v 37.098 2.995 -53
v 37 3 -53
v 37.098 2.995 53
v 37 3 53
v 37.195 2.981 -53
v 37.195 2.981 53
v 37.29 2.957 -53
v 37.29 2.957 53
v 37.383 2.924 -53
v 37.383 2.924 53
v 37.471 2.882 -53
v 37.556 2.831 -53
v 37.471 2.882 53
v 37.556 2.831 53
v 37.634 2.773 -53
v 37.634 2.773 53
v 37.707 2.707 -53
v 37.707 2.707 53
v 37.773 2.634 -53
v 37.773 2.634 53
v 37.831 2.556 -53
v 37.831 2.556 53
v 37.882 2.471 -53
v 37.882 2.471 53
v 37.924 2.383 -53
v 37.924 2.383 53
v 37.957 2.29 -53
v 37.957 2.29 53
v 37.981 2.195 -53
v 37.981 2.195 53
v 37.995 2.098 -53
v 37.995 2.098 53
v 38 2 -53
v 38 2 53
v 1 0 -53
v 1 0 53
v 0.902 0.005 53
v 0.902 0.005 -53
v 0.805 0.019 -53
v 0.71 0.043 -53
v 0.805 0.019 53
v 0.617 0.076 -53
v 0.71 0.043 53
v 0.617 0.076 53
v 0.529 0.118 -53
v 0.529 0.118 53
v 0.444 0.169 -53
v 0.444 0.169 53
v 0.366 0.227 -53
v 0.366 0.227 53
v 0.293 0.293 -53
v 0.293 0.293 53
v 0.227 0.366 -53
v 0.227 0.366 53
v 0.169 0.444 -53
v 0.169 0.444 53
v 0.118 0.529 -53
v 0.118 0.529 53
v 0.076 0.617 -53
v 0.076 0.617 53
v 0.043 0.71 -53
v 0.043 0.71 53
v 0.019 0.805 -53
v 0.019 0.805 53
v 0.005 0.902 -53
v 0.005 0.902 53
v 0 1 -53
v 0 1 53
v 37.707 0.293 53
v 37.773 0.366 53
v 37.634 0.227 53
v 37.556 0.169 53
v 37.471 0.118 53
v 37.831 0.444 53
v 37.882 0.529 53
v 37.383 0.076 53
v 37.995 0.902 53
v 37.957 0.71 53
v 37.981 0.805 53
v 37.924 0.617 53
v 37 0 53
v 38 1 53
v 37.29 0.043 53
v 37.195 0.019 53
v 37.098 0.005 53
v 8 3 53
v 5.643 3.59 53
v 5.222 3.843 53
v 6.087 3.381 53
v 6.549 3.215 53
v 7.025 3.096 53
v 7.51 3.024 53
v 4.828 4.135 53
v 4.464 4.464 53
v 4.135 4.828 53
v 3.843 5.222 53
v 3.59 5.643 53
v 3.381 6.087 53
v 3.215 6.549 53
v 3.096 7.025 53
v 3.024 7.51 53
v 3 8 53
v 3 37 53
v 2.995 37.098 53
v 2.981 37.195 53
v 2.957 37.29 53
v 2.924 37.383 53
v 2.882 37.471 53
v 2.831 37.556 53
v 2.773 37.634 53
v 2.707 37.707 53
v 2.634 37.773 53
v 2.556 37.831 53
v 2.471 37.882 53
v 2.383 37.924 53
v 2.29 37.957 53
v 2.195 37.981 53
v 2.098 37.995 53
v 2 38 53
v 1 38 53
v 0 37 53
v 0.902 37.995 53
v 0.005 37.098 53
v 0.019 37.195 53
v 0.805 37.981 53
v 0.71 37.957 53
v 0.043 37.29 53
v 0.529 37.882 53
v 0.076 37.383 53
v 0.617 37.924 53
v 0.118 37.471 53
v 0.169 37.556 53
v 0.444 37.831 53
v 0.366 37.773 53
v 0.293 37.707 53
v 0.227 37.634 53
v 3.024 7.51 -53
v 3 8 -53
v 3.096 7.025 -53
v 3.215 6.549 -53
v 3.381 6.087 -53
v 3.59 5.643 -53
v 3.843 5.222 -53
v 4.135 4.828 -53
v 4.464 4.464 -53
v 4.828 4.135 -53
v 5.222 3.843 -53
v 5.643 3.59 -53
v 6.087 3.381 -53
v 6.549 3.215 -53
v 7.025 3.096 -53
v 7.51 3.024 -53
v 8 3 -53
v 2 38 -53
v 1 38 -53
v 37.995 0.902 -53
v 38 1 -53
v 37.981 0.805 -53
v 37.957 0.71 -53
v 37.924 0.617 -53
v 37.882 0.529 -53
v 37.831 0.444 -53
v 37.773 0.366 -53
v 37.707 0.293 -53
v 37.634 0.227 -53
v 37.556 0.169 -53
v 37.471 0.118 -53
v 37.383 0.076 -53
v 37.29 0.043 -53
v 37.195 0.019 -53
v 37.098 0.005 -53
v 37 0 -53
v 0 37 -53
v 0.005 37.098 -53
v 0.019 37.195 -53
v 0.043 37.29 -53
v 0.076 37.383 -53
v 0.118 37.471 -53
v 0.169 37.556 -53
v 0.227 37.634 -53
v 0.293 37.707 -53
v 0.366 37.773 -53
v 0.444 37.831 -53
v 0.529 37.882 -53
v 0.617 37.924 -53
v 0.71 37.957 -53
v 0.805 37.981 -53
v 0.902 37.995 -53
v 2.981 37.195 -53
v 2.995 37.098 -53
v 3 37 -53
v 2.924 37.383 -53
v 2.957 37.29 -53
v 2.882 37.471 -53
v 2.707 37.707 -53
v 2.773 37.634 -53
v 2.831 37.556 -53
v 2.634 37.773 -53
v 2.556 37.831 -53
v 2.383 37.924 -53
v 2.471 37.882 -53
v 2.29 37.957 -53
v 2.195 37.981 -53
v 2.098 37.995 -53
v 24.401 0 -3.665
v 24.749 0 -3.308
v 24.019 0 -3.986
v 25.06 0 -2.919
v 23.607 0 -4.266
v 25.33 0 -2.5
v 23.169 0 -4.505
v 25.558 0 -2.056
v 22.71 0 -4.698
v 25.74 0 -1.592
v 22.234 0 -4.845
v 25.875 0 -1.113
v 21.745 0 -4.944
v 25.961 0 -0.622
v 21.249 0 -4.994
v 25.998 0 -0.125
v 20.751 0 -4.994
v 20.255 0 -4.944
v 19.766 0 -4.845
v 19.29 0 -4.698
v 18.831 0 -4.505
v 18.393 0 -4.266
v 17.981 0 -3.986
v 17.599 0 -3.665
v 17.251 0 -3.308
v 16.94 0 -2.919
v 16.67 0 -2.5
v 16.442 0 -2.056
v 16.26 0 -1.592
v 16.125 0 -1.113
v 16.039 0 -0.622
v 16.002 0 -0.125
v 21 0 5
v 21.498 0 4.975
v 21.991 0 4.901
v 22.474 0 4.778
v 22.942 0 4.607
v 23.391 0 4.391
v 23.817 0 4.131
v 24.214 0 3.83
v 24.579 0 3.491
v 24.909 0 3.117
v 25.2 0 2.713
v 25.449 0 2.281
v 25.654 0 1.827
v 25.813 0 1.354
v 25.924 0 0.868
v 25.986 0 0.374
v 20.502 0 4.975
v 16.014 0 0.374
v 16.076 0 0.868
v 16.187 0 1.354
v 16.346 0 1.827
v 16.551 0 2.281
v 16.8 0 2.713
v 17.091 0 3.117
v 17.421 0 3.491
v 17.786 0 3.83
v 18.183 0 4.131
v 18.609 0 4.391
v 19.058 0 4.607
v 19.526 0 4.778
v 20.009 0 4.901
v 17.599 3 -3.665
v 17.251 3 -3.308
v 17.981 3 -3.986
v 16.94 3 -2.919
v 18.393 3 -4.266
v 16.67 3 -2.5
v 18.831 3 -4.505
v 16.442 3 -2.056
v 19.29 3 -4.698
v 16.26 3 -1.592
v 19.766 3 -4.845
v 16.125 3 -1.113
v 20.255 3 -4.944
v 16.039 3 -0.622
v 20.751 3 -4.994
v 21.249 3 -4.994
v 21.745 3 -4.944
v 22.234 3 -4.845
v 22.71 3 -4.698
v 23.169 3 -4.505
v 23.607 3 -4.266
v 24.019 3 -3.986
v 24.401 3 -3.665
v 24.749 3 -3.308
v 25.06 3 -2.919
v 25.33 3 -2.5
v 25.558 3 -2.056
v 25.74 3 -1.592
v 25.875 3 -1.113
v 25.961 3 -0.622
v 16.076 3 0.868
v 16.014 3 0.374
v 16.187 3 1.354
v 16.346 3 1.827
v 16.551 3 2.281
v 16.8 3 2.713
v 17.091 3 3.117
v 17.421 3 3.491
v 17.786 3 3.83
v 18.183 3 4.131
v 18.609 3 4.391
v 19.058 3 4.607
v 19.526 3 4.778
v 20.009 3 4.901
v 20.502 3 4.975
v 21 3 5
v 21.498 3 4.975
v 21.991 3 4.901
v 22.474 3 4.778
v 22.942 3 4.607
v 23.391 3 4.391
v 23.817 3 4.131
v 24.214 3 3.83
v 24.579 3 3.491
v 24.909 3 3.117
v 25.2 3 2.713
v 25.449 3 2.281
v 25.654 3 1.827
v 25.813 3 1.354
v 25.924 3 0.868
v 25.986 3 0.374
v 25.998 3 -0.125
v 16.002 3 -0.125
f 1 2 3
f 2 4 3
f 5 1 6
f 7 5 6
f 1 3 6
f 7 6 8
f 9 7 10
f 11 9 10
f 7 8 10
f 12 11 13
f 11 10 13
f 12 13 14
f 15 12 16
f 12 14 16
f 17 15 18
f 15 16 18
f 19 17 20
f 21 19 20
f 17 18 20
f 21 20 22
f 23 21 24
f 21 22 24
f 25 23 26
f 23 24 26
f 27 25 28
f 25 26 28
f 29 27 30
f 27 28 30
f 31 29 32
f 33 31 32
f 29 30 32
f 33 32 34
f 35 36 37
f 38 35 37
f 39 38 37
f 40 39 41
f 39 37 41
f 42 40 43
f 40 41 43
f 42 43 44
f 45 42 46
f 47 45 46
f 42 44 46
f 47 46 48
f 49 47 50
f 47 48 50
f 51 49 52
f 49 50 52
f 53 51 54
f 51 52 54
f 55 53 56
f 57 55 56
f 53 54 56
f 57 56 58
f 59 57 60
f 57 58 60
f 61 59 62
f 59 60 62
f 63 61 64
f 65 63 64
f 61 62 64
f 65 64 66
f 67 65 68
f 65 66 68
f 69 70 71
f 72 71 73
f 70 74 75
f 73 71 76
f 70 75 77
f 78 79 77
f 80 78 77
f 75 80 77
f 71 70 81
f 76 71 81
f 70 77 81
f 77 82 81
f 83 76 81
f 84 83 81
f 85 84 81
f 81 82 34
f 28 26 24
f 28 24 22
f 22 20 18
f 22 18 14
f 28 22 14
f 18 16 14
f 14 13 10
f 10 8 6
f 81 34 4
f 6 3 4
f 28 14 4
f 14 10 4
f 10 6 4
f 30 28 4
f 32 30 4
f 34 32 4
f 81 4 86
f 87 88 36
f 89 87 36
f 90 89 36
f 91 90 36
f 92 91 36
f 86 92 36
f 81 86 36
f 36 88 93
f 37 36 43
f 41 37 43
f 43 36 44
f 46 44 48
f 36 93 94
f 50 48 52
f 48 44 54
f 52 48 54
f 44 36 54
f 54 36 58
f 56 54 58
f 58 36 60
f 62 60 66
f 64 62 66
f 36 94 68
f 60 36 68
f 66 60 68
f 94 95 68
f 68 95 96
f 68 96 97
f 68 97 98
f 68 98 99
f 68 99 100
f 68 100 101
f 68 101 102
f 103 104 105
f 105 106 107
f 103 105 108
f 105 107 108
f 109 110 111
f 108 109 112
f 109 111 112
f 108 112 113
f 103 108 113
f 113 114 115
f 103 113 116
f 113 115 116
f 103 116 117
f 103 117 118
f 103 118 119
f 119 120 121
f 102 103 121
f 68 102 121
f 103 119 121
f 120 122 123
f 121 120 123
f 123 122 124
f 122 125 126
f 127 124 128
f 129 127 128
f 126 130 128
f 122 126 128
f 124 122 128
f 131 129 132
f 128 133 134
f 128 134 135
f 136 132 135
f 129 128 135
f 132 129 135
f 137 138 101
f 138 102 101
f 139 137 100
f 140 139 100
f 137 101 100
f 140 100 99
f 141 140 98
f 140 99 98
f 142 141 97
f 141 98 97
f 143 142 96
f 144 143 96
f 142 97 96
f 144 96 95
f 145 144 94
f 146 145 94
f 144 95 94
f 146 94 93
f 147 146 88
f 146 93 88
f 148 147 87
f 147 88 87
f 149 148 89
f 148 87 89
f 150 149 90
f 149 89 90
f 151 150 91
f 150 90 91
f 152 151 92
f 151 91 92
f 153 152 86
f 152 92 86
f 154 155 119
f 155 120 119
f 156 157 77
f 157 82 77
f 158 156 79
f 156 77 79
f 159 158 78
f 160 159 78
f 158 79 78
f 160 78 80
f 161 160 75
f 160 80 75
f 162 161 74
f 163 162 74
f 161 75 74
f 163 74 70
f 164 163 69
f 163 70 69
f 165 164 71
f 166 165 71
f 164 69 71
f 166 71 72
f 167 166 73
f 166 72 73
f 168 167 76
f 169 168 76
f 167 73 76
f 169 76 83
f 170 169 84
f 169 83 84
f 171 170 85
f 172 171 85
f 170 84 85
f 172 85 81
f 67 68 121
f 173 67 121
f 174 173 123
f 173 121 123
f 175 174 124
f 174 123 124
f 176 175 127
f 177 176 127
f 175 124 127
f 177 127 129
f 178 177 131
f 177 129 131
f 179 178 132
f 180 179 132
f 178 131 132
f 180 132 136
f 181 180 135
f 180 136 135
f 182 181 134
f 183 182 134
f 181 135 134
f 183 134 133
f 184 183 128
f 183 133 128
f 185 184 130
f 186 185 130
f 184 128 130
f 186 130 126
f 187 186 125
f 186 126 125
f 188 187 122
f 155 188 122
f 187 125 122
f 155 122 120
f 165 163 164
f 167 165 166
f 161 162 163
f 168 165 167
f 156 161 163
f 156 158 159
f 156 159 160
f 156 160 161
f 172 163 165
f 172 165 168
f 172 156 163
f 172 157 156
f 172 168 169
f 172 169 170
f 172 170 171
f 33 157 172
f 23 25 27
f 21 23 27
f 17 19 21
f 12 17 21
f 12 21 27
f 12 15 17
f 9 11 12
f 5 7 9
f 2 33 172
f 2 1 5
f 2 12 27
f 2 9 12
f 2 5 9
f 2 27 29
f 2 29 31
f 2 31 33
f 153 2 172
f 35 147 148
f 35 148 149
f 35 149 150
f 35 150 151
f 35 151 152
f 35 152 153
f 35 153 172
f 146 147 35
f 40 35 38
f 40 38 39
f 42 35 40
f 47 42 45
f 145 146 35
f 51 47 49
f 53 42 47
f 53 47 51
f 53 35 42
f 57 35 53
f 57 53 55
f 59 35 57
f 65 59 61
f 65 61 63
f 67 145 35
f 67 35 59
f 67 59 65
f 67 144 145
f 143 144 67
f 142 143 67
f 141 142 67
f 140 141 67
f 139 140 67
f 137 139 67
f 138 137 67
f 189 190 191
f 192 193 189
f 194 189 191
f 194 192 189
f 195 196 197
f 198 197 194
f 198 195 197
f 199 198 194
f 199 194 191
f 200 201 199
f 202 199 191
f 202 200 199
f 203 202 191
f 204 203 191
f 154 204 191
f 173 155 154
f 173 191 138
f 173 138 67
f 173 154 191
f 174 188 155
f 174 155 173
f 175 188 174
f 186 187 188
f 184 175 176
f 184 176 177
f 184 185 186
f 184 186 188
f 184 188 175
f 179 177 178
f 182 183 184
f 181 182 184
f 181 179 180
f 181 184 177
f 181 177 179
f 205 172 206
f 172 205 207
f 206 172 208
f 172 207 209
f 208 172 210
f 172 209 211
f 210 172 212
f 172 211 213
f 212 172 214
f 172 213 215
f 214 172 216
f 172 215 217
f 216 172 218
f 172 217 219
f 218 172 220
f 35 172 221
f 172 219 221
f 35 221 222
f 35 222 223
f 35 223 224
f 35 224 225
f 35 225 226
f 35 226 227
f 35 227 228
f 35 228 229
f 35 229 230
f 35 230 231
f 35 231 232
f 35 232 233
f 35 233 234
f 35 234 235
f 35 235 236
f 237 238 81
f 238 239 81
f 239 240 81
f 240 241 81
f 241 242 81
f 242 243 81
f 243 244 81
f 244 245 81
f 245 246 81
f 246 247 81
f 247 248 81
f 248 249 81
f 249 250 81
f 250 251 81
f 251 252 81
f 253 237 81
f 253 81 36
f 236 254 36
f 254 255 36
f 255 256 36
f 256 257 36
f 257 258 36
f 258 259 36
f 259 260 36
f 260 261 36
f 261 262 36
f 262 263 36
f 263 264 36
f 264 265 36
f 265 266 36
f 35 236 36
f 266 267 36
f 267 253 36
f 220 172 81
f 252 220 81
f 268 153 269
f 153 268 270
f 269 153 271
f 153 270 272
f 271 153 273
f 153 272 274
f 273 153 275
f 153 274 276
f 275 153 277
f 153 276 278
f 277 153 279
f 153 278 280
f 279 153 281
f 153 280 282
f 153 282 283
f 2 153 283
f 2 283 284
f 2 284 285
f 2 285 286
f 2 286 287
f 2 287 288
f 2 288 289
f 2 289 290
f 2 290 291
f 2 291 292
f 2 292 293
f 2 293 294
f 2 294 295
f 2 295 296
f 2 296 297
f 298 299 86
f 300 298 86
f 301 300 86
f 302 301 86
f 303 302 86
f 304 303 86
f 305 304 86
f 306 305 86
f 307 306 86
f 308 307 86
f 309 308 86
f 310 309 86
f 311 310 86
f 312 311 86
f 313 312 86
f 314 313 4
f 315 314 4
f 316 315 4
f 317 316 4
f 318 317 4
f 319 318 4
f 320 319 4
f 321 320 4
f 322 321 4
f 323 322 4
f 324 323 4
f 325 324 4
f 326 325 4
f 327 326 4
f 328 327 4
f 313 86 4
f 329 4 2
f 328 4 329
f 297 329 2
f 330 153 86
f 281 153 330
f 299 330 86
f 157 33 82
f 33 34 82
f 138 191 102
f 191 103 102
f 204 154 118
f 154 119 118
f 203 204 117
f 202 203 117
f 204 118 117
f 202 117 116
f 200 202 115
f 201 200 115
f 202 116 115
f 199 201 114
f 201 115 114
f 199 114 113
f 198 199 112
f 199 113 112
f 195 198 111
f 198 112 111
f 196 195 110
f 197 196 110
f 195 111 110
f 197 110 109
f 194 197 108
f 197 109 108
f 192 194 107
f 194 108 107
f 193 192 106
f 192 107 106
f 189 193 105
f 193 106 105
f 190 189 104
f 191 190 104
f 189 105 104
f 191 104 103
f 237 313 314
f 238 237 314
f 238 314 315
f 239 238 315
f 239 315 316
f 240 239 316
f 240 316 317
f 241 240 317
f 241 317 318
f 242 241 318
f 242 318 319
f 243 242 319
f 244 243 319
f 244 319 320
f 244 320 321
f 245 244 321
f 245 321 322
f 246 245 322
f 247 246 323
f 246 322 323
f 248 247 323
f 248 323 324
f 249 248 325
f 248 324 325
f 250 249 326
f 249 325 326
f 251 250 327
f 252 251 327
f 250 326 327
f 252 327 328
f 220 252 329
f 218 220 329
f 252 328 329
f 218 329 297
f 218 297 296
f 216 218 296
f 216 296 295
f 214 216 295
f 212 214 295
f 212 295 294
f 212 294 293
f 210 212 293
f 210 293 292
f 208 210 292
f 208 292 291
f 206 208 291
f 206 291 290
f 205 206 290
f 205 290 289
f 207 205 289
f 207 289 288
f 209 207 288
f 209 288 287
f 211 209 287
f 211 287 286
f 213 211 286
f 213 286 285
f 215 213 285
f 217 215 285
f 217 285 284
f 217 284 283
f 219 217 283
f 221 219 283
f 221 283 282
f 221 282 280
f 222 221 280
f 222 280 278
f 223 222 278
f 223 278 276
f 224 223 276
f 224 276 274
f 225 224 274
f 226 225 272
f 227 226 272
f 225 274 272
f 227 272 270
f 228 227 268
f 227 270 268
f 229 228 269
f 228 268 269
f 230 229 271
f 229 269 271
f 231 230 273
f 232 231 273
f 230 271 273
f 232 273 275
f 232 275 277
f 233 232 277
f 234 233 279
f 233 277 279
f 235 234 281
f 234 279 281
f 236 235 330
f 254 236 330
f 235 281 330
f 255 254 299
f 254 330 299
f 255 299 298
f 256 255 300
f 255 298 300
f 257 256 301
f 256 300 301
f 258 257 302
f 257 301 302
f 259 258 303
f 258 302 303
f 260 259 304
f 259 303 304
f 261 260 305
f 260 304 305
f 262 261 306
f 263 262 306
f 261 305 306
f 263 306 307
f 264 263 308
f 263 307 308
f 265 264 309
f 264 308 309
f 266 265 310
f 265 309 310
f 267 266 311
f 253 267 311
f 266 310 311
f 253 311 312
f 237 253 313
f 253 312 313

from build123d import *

# Parameters (mm, degrees)
EXTRUDE_1_DEPTH     = 53
SKETCH_2_R          = 5
CUT_EXTRUDE_1_DEPTH = 75.01351228


with BuildPart() as part:
    # 草图1 → 凸台-拉伸1 (new, symmetric)
    with BuildSketch(Plane.XY):
        with BuildLine():
            Line((0, 1), (0, 37))
            ThreePointArc((0, 37), (0.292893219, 37.707106781), (1, 38))
            Line((1, 38), (2, 38))
            ThreePointArc((2, 38), (2.707106781, 37.707106781), (3, 37))
            Line((3, 37), (3, 8))
            ThreePointArc((3, 8), (4.464466094, 4.464466094), (8, 3))
            Line((8, 3), (37, 3))
            ThreePointArc((37, 3), (37.707106781, 2.707106781), (38, 2))
            Line((38, 2), (38, 1))
            ThreePointArc((38, 1), (37.707106781, 0.292893219), (37, 0))
            Line((37, 0), (1, 0))
            ThreePointArc((1, 0), (0.292893219, 0.292893219), (0, 1))
        make_face()
    extrude(amount=EXTRUDE_1_DEPTH, both=True)

    # 草图2 → 切除-拉伸1 (cut, through all)
    with BuildSketch(Plane(origin=(0, 3, 0), x_dir=(1, 0, 0), z_dir=(0, 1, 0))):
        with Locations(Location((21, 0, 0), (0, 0, 270))):
            Circle(SKETCH_2_R)
    extrude(amount=-CUT_EXTRUDE_1_DEPTH, mode=Mode.SUBTRACT)


solid = part.part
